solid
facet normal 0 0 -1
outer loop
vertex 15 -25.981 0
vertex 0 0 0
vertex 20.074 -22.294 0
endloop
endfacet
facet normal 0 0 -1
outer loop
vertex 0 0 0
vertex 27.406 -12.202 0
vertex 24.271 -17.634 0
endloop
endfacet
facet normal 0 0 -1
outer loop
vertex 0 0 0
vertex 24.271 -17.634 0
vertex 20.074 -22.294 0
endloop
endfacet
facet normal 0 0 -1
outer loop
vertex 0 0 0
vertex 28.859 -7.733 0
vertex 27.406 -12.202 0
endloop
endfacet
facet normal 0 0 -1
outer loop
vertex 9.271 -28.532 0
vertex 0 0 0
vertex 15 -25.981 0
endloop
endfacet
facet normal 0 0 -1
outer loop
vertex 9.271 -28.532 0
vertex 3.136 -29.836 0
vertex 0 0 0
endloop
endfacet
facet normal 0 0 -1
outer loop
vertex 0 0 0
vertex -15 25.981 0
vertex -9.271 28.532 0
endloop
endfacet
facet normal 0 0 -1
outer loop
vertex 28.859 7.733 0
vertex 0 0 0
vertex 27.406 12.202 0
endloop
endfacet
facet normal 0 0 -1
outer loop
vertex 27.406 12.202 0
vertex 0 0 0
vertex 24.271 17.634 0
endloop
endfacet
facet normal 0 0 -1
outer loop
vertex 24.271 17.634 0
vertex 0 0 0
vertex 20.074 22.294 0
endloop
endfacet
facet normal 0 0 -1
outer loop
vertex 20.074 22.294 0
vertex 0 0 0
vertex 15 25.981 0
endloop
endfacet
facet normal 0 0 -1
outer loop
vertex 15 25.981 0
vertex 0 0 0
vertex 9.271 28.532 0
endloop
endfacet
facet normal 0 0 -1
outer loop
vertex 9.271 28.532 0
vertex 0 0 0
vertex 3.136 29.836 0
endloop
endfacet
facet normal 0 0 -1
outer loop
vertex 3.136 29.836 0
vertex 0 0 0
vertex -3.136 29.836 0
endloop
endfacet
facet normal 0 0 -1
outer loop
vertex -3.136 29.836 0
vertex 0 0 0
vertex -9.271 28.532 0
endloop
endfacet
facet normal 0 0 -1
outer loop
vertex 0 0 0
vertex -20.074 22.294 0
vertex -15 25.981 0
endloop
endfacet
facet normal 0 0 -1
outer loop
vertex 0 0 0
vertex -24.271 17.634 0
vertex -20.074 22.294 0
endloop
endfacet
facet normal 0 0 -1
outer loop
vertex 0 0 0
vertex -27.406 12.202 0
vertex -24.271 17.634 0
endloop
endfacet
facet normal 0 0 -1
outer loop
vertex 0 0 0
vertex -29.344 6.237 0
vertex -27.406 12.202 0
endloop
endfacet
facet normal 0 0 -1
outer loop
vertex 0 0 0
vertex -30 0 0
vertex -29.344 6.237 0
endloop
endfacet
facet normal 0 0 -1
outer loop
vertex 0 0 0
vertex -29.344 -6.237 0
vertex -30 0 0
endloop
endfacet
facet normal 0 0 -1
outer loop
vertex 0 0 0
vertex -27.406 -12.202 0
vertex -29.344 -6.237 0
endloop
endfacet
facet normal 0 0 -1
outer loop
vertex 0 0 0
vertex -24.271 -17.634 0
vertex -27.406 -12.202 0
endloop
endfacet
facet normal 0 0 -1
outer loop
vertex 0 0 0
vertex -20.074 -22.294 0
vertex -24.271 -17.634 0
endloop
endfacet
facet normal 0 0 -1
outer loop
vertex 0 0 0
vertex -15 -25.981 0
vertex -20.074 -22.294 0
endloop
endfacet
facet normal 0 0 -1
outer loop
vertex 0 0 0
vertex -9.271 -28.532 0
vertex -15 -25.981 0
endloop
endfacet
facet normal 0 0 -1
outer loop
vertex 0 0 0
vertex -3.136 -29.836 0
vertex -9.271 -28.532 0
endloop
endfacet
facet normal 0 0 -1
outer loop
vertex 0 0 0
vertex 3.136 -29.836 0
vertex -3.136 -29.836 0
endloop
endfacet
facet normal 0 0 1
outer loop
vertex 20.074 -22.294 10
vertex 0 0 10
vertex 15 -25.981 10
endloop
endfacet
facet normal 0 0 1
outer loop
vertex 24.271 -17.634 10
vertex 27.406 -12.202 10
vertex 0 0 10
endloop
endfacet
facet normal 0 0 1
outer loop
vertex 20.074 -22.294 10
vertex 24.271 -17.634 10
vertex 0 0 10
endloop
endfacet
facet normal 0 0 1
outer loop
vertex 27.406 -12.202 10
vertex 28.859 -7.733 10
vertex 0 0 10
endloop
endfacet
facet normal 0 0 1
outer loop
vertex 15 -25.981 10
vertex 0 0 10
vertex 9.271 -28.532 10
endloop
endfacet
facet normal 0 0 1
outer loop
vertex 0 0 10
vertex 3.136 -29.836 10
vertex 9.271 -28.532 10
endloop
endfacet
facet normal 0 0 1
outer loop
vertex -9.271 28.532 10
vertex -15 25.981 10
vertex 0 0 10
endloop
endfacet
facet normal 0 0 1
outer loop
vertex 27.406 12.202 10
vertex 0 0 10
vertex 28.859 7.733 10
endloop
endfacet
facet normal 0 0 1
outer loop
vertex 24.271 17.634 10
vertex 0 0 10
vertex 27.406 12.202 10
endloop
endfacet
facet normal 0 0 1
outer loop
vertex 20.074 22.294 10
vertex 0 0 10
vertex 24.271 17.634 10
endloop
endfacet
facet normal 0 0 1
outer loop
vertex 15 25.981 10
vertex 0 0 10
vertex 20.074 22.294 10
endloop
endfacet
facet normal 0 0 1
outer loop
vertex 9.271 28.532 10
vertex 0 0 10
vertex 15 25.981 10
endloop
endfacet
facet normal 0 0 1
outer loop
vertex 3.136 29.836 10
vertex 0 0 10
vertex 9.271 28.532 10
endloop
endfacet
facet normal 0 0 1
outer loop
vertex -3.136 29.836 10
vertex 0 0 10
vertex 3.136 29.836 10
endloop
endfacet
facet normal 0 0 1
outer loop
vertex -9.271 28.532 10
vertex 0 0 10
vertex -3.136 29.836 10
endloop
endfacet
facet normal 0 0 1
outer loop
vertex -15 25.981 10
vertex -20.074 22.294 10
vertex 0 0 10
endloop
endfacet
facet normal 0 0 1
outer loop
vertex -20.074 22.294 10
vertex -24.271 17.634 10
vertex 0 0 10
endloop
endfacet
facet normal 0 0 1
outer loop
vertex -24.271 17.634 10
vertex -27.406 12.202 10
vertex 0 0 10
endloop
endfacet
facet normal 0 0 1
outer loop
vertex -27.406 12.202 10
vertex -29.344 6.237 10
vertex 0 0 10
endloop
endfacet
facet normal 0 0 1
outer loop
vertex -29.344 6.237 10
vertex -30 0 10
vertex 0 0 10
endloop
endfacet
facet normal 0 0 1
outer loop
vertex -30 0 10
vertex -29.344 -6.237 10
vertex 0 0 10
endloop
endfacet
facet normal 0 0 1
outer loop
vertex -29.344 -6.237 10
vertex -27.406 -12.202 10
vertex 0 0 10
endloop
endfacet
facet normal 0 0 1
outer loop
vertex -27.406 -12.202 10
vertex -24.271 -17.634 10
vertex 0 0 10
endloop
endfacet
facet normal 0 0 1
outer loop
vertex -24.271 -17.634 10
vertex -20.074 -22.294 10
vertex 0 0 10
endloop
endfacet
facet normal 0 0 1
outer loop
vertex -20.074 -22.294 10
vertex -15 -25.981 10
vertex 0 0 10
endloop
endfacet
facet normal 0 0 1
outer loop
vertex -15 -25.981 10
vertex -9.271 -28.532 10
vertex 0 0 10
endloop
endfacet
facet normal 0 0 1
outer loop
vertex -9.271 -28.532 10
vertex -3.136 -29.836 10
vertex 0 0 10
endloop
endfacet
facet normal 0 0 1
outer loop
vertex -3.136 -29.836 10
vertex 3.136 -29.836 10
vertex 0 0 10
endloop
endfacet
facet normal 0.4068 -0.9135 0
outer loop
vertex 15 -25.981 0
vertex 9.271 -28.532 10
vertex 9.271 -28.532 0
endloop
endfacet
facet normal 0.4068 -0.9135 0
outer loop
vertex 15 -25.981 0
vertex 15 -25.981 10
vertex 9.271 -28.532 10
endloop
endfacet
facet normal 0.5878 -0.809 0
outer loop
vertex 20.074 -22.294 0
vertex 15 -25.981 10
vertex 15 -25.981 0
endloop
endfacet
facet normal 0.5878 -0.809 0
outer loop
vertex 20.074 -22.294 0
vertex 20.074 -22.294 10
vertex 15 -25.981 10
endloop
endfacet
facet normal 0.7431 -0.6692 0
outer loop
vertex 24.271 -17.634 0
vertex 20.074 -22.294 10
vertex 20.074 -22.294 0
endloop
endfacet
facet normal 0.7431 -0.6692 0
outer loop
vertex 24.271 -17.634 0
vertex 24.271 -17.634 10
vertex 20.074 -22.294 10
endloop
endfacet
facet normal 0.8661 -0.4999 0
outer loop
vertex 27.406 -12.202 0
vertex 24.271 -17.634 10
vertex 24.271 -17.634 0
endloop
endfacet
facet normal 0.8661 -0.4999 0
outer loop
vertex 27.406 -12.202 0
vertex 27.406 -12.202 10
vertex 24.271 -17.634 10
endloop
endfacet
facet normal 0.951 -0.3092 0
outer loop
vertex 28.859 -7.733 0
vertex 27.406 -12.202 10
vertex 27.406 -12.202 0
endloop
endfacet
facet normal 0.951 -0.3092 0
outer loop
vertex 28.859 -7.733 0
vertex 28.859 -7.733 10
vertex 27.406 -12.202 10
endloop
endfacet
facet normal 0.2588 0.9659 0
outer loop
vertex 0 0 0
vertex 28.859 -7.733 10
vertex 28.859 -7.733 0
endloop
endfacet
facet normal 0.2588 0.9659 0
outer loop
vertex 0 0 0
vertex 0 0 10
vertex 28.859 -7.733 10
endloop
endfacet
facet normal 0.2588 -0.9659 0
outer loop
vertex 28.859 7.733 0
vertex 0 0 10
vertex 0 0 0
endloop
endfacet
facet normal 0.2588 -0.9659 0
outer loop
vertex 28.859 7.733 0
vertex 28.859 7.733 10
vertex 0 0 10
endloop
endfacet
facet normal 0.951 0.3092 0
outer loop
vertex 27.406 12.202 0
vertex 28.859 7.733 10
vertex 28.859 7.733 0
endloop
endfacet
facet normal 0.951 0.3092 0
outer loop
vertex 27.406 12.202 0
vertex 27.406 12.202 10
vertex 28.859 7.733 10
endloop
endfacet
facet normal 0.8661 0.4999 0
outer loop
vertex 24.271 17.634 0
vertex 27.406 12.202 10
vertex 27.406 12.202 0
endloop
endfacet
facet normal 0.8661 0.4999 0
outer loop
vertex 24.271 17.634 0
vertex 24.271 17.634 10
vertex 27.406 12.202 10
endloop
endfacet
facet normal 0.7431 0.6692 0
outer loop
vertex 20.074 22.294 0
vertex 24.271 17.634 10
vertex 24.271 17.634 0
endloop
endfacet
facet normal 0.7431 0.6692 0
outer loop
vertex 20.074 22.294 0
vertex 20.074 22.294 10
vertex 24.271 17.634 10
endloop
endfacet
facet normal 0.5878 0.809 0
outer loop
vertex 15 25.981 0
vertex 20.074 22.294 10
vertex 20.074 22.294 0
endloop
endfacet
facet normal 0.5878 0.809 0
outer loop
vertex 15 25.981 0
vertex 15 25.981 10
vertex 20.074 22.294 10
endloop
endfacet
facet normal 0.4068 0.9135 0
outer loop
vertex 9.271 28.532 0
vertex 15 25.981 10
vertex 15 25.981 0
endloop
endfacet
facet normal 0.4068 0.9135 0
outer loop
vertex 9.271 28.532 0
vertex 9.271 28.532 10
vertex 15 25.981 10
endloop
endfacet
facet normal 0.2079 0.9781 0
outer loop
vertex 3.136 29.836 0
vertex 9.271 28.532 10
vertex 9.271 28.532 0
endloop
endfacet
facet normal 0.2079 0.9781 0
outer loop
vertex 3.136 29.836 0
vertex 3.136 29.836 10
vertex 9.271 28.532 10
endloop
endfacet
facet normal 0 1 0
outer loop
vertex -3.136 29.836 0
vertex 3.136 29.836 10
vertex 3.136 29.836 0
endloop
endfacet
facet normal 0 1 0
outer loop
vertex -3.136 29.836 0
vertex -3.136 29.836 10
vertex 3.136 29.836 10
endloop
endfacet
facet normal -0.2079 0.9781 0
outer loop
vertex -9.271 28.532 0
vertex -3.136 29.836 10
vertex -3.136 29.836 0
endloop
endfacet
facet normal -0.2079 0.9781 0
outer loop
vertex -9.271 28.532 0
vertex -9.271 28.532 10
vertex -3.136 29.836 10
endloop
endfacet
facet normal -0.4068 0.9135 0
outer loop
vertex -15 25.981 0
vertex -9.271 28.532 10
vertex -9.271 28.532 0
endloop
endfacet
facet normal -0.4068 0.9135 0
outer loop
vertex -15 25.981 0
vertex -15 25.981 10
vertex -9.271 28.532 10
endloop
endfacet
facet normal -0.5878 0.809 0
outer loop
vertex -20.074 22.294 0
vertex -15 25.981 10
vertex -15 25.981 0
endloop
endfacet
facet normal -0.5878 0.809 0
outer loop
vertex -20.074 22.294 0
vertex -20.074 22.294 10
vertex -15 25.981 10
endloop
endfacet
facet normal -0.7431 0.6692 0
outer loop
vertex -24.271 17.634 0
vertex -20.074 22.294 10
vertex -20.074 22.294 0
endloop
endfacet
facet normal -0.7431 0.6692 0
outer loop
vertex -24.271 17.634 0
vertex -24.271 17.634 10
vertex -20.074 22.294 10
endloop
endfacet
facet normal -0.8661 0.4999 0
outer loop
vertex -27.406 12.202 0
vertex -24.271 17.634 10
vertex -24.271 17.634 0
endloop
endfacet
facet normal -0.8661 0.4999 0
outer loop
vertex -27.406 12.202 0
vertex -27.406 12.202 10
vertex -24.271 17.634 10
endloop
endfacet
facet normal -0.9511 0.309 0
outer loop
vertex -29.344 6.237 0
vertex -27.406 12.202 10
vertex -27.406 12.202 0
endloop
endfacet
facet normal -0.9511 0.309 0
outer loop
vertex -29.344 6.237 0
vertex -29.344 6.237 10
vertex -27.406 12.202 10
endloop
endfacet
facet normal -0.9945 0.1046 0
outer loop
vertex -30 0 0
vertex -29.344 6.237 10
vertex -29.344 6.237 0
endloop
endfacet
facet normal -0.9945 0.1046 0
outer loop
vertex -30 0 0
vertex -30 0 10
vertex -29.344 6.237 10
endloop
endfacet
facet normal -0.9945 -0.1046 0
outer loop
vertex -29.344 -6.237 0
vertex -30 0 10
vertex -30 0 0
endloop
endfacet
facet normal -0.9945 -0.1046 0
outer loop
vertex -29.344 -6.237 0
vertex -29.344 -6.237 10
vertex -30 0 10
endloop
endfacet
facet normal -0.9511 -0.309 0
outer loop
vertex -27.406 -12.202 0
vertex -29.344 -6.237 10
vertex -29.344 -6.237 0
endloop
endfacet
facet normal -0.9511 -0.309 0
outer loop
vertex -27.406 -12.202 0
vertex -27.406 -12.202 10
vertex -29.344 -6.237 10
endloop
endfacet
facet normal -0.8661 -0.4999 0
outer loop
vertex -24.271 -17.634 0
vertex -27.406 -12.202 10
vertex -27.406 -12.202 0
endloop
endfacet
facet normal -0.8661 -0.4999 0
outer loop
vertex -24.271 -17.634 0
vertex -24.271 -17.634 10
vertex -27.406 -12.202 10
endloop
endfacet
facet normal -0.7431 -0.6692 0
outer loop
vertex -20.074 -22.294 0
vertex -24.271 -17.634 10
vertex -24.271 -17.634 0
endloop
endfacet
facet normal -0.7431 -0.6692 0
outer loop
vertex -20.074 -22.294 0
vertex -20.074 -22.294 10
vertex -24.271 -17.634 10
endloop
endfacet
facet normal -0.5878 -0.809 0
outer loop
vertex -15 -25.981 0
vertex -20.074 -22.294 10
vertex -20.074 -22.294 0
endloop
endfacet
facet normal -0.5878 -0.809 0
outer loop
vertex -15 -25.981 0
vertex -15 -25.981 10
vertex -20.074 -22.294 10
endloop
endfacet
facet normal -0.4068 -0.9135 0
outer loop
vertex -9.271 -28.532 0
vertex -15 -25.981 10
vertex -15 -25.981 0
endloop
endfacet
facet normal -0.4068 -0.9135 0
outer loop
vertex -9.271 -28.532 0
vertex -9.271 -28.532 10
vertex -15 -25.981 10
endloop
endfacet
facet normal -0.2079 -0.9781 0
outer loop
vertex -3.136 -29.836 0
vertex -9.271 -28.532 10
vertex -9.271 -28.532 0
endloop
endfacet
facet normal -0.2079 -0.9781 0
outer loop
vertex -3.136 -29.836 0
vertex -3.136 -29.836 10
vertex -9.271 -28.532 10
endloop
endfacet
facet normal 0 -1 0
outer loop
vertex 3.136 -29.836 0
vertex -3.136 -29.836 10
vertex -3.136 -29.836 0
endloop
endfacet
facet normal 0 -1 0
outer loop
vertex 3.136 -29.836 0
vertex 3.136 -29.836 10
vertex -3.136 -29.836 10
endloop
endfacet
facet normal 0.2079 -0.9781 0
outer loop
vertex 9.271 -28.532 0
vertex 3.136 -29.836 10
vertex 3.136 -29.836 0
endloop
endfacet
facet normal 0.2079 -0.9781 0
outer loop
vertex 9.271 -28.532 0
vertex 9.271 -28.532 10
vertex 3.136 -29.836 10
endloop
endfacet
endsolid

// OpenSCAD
// Unit of length: Unit.MM
linear_extrude(height = 10.0, center = false, convexity = 2, twist = 0.0, scale = 1.0)
{
   intersection()
   {
      circle(r = 30.0, $fa = 12.0, $fs = 2.0, $fn = 0);
      polygon(points = [[0.0, 0.0], [33.4718, 8.9687], [0.0, 42.4405], [-42.4405, 0.0], [0.0, -42.4405], [33.4718, -8.9687]], convexity = 2);
   }
}
